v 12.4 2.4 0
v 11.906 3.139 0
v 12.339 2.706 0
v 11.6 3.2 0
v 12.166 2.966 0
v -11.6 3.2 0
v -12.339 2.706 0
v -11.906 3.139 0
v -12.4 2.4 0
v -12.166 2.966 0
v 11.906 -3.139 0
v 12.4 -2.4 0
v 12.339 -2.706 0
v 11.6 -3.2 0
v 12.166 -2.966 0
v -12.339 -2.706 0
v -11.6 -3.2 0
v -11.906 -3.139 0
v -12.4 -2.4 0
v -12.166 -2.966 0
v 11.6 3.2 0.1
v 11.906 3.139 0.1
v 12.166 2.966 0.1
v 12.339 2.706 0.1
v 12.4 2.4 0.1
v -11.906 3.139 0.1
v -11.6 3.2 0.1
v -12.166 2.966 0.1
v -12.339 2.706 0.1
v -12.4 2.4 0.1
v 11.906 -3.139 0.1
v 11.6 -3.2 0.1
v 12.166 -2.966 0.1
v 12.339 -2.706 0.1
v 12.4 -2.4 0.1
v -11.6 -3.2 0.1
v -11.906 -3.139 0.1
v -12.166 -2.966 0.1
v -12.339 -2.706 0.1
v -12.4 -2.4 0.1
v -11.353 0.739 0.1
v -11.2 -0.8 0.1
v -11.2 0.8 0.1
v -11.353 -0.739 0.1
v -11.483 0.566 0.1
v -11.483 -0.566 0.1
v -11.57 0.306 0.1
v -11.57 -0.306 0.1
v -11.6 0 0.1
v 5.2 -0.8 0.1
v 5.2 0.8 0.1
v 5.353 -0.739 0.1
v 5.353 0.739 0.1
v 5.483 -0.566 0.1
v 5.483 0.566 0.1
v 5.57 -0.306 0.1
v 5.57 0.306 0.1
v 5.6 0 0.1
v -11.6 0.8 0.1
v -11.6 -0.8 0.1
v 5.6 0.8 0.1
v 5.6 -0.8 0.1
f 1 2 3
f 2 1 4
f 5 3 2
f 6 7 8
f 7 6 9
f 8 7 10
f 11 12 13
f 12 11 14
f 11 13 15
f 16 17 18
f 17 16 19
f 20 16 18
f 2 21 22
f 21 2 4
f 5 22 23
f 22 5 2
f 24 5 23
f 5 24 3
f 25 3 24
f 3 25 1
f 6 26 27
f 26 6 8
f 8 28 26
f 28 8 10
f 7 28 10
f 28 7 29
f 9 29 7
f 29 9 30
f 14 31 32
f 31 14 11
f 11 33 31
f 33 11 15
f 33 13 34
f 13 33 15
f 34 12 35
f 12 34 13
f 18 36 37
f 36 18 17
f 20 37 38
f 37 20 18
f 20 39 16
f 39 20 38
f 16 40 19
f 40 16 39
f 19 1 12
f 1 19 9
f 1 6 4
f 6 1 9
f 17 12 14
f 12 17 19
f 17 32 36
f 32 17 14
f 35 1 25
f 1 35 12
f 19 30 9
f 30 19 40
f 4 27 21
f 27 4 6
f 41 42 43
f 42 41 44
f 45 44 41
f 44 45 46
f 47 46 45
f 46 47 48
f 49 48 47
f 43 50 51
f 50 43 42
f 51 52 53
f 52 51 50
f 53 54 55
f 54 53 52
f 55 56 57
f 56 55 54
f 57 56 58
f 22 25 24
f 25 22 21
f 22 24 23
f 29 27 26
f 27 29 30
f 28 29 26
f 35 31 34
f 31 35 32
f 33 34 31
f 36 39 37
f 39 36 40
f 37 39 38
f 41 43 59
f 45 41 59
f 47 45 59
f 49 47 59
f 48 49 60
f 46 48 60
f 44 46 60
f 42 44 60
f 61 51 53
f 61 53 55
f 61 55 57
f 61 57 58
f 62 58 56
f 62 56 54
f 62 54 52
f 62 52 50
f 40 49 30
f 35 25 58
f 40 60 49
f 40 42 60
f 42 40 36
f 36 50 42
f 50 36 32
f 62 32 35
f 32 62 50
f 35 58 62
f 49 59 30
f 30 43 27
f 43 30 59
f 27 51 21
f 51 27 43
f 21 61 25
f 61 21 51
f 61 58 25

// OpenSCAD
// file: ../p/2-4ndis.scad
use <../lib.scad>
function ldraw_lib__2_4ndis() = [
// 0 Disc Negative 0.5
// 0 Name: 2-4ndis.dat
// 0 Author: James Jessiman
// 0 !LDRAW_ORG Primitive UPDATE 2012-01
// 0 !LICENSE Licensed under CC BY 4.0 : see CAreadme.txt
// 
// 0 BFC CERTIFY CCW
  [0,"BFC","CERTIFY"],
  [0,"BFC","CCW"],
// 
// 0 !HISTORY 2002-03-23 [sbliss] Added BFC statement; compacted code
// 0 !HISTORY 2002-04-25 [PTadmin] Official Update 2002-02
// 0 !HISTORY 2007-06-24 [PTadmin] Header formatted for Contributor Agreement
// 0 !HISTORY 2008-07-01 [PTadmin] Official Update 2008-01
// 0 !HISTORY 2012-02-16 [Philo] Changed to CCW
// 0 !HISTORY 2012-03-30 [PTadmin] Official Update 2012-01
// 
// 
// 3 16 0.9239 0 0.3827 1 0 0 1 0 1
  [3,16,0.9239,0,0.3827,1,0,0,1,0,1],
// 3 16 0.7071 0 0.7071 0.9239 0 0.3827 1 0 1
  [3,16,0.7071,0,0.7071,0.9239,0,0.3827,1,0,1],
// 3 16 0.3827 0 0.9239 0.7071 0 0.7071 1 0 1
  [3,16,0.3827,0,0.9239,0.7071,0,0.7071,1,0,1],
// 3 16 0 0 1 0.3827 0 0.9239 1 0 1
  [3,16,0,0,1,0.3827,0,0.9239,1,0,1],
// 3 16 -0.3827 0 0.9239 0 0 1 -1 0 1
  [3,16,-0.3827,0,0.9239,0,0,1,-1,0,1],
// 3 16 -0.7071 0 0.7071 -0.3827 0 0.9239 -1 0 1
  [3,16,-0.7071,0,0.7071,-0.3827,0,0.9239,-1,0,1],
// 3 16 -0.9239 0 0.3827 -0.7071 0 0.7071 -1 0 1
  [3,16,-0.9239,0,0.3827,-0.7071,0,0.7071,-1,0,1],
// 3 16 -1 0 0 -0.9239 0 0.3827 -1 0 1
  [3,16,-1,0,0,-0.9239,0,0.3827,-1,0,1],
];
module ldraw_lib__2_4ndis(step=0, col=false, unit=2/5, alt=false, line=0.2, solid=!$preview)
    makepoly(ldraw_lib__2_4ndis(), step=step, col=col, unit=unit, alt=alt, line=line, solid=solid);
ldraw_lib__2_4ndis(line=0.2);
// file: ../p/2-4chrd.scad
use <../lib.scad>
function ldraw_lib__2_4chrd() = [
// 0 Chord 0.5
// 0 Name: 2-4chrd.dat
// 0 Author: Philippe Hurbain [Philo]
// 0 !LDRAW_ORG Primitive UPDATE 2014-01
// 0 !LICENSE Licensed under CC BY 4.0 : see CAreadme.txt
// 
// 0 BFC CERTIFY CCW
  [0,"BFC","CERTIFY"],
  [0,"BFC","CCW"],
// 
// 0 !HISTORY 2014-06-21 [PTadmin] Official Update 2014-01
// 
// 
// 4 16 0.9239 0 0.3827 -0.9239 0 0.3827 -1 0 0 1 0 0
  [4,16,0.9239,0,0.3827,-0.9239,0,0.3827,-1,0,0,1,0,0],
// 4 16 0.7071 0 0.7071 -0.7071 0 0.7071 -0.9239 0 0.3827 0.9239 0 0.3827
  [4,16,0.7071,0,0.7071,-0.7071,0,0.7071,-0.9239,0,0.3827,0.9239,0,0.3827],
// 4 16 0.3827 0 0.9239 -0.3827 0 0.9239 -0.7071 0 0.7071 0.7071 0 0.7071
  [4,16,0.3827,0,0.9239,-0.3827,0,0.9239,-0.7071,0,0.7071,0.7071,0,0.7071],
// 3 16 0 0 1 -0.3827 0 0.9239 0.3827 0 0.9239
  [3,16,0,0,1,-0.3827,0,0.9239,0.3827,0,0.9239],
];
module ldraw_lib__2_4chrd(step=0, col=false, unit=2/5, alt=false, line=0.2, solid=!$preview)
    makepoly(ldraw_lib__2_4chrd(), step=step, col=col, unit=unit, alt=alt, line=line, solid=solid);
ldraw_lib__2_4chrd(line=0.2);
// file: ../p/1-4cyli.scad
use <../lib.scad>
function ldraw_lib__1_4cyli() = [
// 0 Cylinder 0.25
// 0 Name: 1-4cyli.dat
// 0 Author: James Jessiman
// 0 !LDRAW_ORG Primitive UPDATE 2012-01
// 0 !LICENSE Licensed under CC BY 4.0 : see CAreadme.txt
// 
// 0 BFC CERTIFY CCW
  [0,"BFC","CERTIFY"],
  [0,"BFC","CCW"],
// 
// 0 !HISTORY 2002-03-23 [sbliss] Added BFC statement.
// 0 !HISTORY 2002-04-25 [PTadmin] Official Update 2002-02
// 0 !HISTORY 2007-06-22 [PTadmin] Header formatted for Contributor Agreement
// 0 !HISTORY 2008-07-01 [PTadmin] Official Update 2008-01
// 0 !HISTORY 2012-02-16 [Philo] Changed to CCW
// 0 !HISTORY 2012-03-30 [PTadmin] Official Update 2012-01
// 
// 
// 4 16 1 1 0 0.9239 1 0.3827 0.9239 0 0.3827 1 0 0
  [4,16,1,1,0,0.9239,1,0.3827,0.9239,0,0.3827,1,0,0],
// 5 24 1 0 0 1 1 0 0.9239 0 0.3827 1 0 -1
  [5,24,1,0,0,1,1,0,0.9239,0,0.3827,1,0,-1],
// 4 16 0.9239 1 0.3827 0.7071 1 0.7071 0.7071 0 0.7071 0.9239 0 0.3827
  [4,16,0.9239,1,0.3827,0.7071,1,0.7071,0.7071,0,0.7071,0.9239,0,0.3827],
// 5 24 0.9239 0 0.3827 0.9239 1 0.3827 0.7071 0 0.7071 1 0 0
  [5,24,0.9239,0,0.3827,0.9239,1,0.3827,0.7071,0,0.7071,1,0,0],
// 4 16 0.7071 1 0.7071 0.3827 1 0.9239 0.3827 0 0.9239 0.7071 0 0.7071
  [4,16,0.7071,1,0.7071,0.3827,1,0.9239,0.3827,0,0.9239,0.7071,0,0.7071],
// 5 24 0.7071 0 0.7071 0.7071 1 0.7071 0.3827 0 0.9239 0.9239 0 0.3827
  [5,24,0.7071,0,0.7071,0.7071,1,0.7071,0.3827,0,0.9239,0.9239,0,0.3827],
// 4 16 0.3827 1 0.9239 0 1 1 0 0 1 0.3827 0 0.9239
  [4,16,0.3827,1,0.9239,0,1,1,0,0,1,0.3827,0,0.9239],
// 5 24 0.3827 0 0.9239 0.3827 1 0.9239 0 0 1 0.7071 0 0.7071
  [5,24,0.3827,0,0.9239,0.3827,1,0.9239,0,0,1,0.7071,0,0.7071],
// 5 24 0 0 1 0 1 1 0.3827 0 0.9239 -1 0 1
  [5,24,0,0,1,0,1,1,0.3827,0,0.9239,-1,0,1],
];
module ldraw_lib__1_4cyli(step=0, col=false, unit=2/5, alt=false, line=0.2, solid=!$preview)
    makepoly(ldraw_lib__1_4cyli(), step=step, col=col, unit=unit, alt=alt, line=line, solid=solid);
ldraw_lib__1_4cyli(line=0.2);
// file: ../p/1-4chrd.scad
use <../lib.scad>
function ldraw_lib__1_4chrd() = [
// 0 Chord 0.25
// 0 Name: 1-4chrd.dat
// 0 Author: Tony Hafner [hafhead]
// 0 !LDRAW_ORG Primitive UPDATE 2012-02
// 0 !LICENSE Licensed under CC BY 2.0 and CC BY 4.0 : see CAreadme.txt
// 
// 0 BFC CERTIFY CCW
  [0,"BFC","CERTIFY"],
  [0,"BFC","CCW"],
// 
// 0 !HISTORY 2004-04-22 [PTadmin] Official Update 2004-02
// 0 !HISTORY 2007-10-09 [PTadmin] Header formatted for Contributor Agreement
// 0 !HISTORY 2008-07-01 [PTadmin] Official Update 2008-01
// 0 !HISTORY 2012-08-02 [MMR1988] Re-creation with PrimGen2 and Rectifier
// 0 !HISTORY 2012-08-09 [PTadmin] Official Update 2012-02
// 
// 
// 4 16 0.9239 0 0.3827 0.3827 0 0.9239 0 0 1 1 0 0
  [4,16,0.9239,0,0.3827,0.3827,0,0.9239,0,0,1,1,0,0],
// 3 16 0.7071 0 0.7071 0.3827 0 0.9239 0.9239 0 0.3827
  [3,16,0.7071,0,0.7071,0.3827,0,0.9239,0.9239,0,0.3827],
];
module ldraw_lib__1_4chrd(step=0, col=false, unit=2/5, alt=false, line=0.2, solid=!$preview)
    makepoly(ldraw_lib__1_4chrd(), step=step, col=col, unit=unit, alt=alt, line=line, solid=solid);
ldraw_lib__1_4chrd(line=0.2);
// main file
use <../lib.scad>
use <../p/1-4chrd.scad>
use <../p/1-4cyli.scad>
use <../p/2-4chrd.scad>
use <../p/2-4ndis.scad>
function ldraw_lib__6283148d() = [
// 0 Sticker  0.8 x  3.1 with Red Stripe on Black
// 0 Name: 6283148d.dat
// 0 Author: Chris Dee [cwdee]
// 0 !LDRAW_ORG Part UPDATE 2022-03
// 0 !LICENSE Licensed under CC BY 4.0 : see CAreadme.txt
// 
// 0 BFC CERTIFY CCW
  [0,"BFC","CERTIFY"],
  [0,"BFC","CCW"],
// 
// 0 !KEYWORDS Defender, Land Rover, Set 42110
// 
// 0 !HISTORY 2022-05-07 [PTadmin] Official Update 2022-03
// 
// 
// 1 16 29 0 6 0 0 2 0 -1 0 2 0 0 1-4chrd.dat
  [1,16,29,0,6,0,0,2,0,-1,0,2,0,0, ldraw_lib__1_4chrd()],
// 1 16 -29 0 6 0 0 -2 0 -1 0 2 0 0 1-4chrd.dat
  [1,16,-29,0,6,0,0,-2,0,-1,0,2,0,0, ldraw_lib__1_4chrd()],
// 1 16 29 0 -6 0 0 2 0 -1 0 -2 0 0 1-4chrd.dat
  [1,16,29,0,-6,0,0,2,0,-1,0,-2,0,0, ldraw_lib__1_4chrd()],
// 1 16 -29 0 -6 0 0 -2 0 -1 0 -2 0 0 1-4chrd.dat
  [1,16,-29,0,-6,0,0,-2,0,-1,0,-2,0,0, ldraw_lib__1_4chrd()],
// 
// 1 16 29 0 6 0 0 2 0 -0.25 0 2 0 0 1-4cyli.dat
  [1,16,29,0,6,0,0,2,0,-0.25,0,2,0,0, ldraw_lib__1_4cyli()],
// 1 16 -29 0 6 0 0 -2 0 -0.25 0 2 0 0 1-4cyli.dat
  [1,16,-29,0,6,0,0,-2,0,-0.25,0,2,0,0, ldraw_lib__1_4cyli()],
// 1 16 29 0 -6 0 0 2 0 -0.25 0 -2 0 0 1-4cyli.dat
  [1,16,29,0,-6,0,0,2,0,-0.25,0,-2,0,0, ldraw_lib__1_4cyli()],
// 1 16 -29 0 -6 0 0 -2 0 -0.25 0 -2 0 0 1-4cyli.dat
  [1,16,-29,0,-6,0,0,-2,0,-0.25,0,-2,0,0, ldraw_lib__1_4cyli()],
// 
// 4 16 -31 0 -6 -31 0 6 31 0 6 31 0 -6
  [4,16,-31,0,-6,-31,0,6,31,0,6,31,0,-6],
// 4 16 -31 0 6 -29 0 8 29 0 8 31 0 6
  [4,16,-31,0,6,-29,0,8,29,0,8,31,0,6],
// 4 16 29 0 -8 -29 0 -8 -31 0 -6 31 0 -6
  [4,16,29,0,-8,-29,0,-8,-31,0,-6,31,0,-6],
// 4 16 -29 -0.25 -8 -29 0 -8 29 0 -8 29 -0.25 -8
  [4,16,-29,-0.25,-8,-29,0,-8,29,0,-8,29,-0.25,-8],
// 4 16 31 -0.25 6 31 -0.25 -6 31 0 -6 31 0 6
  [4,16,31,-0.25,6,31,-0.25,-6,31,0,-6,31,0,6],
// 4 16 -31 0 -6 -31 -0.25 -6 -31 -0.25 6 -31 0 6
  [4,16,-31,0,-6,-31,-0.25,-6,-31,-0.25,6,-31,0,6],
// 4 16 -29 0 8 -29 -0.25 8 29 -0.25 8 29 0 8
  [4,16,-29,0,8,-29,-0.25,8,29,-0.25,8,29,0,8],
// 0 // Stripe
// 1 4 -28 -0.25 0 0 0 -1 0 1 0 2 0 0 2-4chrd.dat
  [1,4,-28,-0.25,0,0,0,-1,0,1,0,2,0,0, ldraw_lib__2_4chrd()],
// 4 4 -28 -0.25 -2 13 -0.25 -2 13 -0.25 2 -28 -0.25 2
  [4,4,-28,-0.25,-2,13,-0.25,-2,13,-0.25,2,-28,-0.25,2],
// 1 4 13 -0.25 0 0 0 1 0 1 0 2 0 0 2-4chrd.dat
  [1,4,13,-0.25,0,0,0,1,0,1,0,2,0,0, ldraw_lib__2_4chrd()],
// 0 // Background
// 1 0 29 -0.25 6 0 0 2 0 1 0 2 0 0 1-4chrd.dat
  [1,0,29,-0.25,6,0,0,2,0,1,0,2,0,0, ldraw_lib__1_4chrd()],
// 1 0 -29 -0.25 6 0 0 -2 0 1 0 2 0 0 1-4chrd.dat
  [1,0,-29,-0.25,6,0,0,-2,0,1,0,2,0,0, ldraw_lib__1_4chrd()],
// 1 0 29 -0.25 -6 0 0 2 0 1 0 -2 0 0 1-4chrd.dat
  [1,0,29,-0.25,-6,0,0,2,0,1,0,-2,0,0, ldraw_lib__1_4chrd()],
// 1 0 -29 -0.25 -6 0 0 -2 0 1 0 -2 0 0 1-4chrd.dat
  [1,0,-29,-0.25,-6,0,0,-2,0,1,0,-2,0,0, ldraw_lib__1_4chrd()],
// 
// 1 0 -28 -0.25 0 0 0 -1 0 1 0 2 0 0 2-4ndis.dat
  [1,0,-28,-0.25,0,0,0,-1,0,1,0,2,0,0, ldraw_lib__2_4ndis()],
// 1 0 13 -0.25 0 0 0 1 0 1 0 2 0 0 2-4ndis.dat
  [1,0,13,-0.25,0,0,0,1,0,1,0,2,0,0, ldraw_lib__2_4ndis()],
// 3 0 -31 -0.25 -6 -29 -0.25 0 -31 -0.25 6
  [3,0,-31,-0.25,-6,-29,-0.25,0,-31,-0.25,6],
// 3 0 31 -0.25 -6 31 -0.25 6 14 -0.25 0
  [3,0,31,-0.25,-6,31,-0.25,6,14,-0.25,0],
// 
// 3 0 -31 -0.25 -6 -29 -0.25 -2 -29 -0.25 0
  [3,0,-31,-0.25,-6,-29,-0.25,-2,-29,-0.25,0],
// 4 0 -31 -0.25 -6 -29 -0.25 -8 -28 -0.25 -2 -29 -0.25 -2
  [4,0,-31,-0.25,-6,-29,-0.25,-8,-28,-0.25,-2,-29,-0.25,-2],
// 4 0 -29 -0.25 -8 29 -0.25 -8 13 -0.25 -2 -28 -0.25 -2
  [4,0,-29,-0.25,-8,29,-0.25,-8,13,-0.25,-2,-28,-0.25,-2],
// 4 0 29 -0.25 -8 31 -0.25 -6 14 -0.25 -2 13 -0.25 -2
  [4,0,29,-0.25,-8,31,-0.25,-6,14,-0.25,-2,13,-0.25,-2],
// 3 0 31 -0.25 -6 14 -0.25 0 14 -0.25 -2
  [3,0,31,-0.25,-6,14,-0.25,0,14,-0.25,-2],
// 
// 3 0 -29 -0.25 0 -29 -0.25 2 -31 -0.25 6
  [3,0,-29,-0.25,0,-29,-0.25,2,-31,-0.25,6],
// 4 0 -29 -0.25 2 -28 -0.25 2 -29 -0.25 8 -31 -0.25 6
  [4,0,-29,-0.25,2,-28,-0.25,2,-29,-0.25,8,-31,-0.25,6],
// 4 0 -28 -0.25 2 13 -0.25 2 29 -0.25 8 -29 -0.25 8
  [4,0,-28,-0.25,2,13,-0.25,2,29,-0.25,8,-29,-0.25,8],
// 4 0 13 -0.25 2 14 -0.25 2 31 -0.25 6 29 -0.25 8
  [4,0,13,-0.25,2,14,-0.25,2,31,-0.25,6,29,-0.25,8],
// 3 0 14 -0.25 2 14 -0.25 0 31 -0.25 6
  [3,0,14,-0.25,2,14,-0.25,0,31,-0.25,6],
];
module ldraw_lib__6283148d(step=0, col=false, unit=2/5, alt=false, line=0.2, solid=!$preview)
    makepoly(ldraw_lib__6283148d(), step=step, col=col, unit=unit, alt=alt, line=line, solid=solid);
ldraw_lib__6283148d(line=0.2);
